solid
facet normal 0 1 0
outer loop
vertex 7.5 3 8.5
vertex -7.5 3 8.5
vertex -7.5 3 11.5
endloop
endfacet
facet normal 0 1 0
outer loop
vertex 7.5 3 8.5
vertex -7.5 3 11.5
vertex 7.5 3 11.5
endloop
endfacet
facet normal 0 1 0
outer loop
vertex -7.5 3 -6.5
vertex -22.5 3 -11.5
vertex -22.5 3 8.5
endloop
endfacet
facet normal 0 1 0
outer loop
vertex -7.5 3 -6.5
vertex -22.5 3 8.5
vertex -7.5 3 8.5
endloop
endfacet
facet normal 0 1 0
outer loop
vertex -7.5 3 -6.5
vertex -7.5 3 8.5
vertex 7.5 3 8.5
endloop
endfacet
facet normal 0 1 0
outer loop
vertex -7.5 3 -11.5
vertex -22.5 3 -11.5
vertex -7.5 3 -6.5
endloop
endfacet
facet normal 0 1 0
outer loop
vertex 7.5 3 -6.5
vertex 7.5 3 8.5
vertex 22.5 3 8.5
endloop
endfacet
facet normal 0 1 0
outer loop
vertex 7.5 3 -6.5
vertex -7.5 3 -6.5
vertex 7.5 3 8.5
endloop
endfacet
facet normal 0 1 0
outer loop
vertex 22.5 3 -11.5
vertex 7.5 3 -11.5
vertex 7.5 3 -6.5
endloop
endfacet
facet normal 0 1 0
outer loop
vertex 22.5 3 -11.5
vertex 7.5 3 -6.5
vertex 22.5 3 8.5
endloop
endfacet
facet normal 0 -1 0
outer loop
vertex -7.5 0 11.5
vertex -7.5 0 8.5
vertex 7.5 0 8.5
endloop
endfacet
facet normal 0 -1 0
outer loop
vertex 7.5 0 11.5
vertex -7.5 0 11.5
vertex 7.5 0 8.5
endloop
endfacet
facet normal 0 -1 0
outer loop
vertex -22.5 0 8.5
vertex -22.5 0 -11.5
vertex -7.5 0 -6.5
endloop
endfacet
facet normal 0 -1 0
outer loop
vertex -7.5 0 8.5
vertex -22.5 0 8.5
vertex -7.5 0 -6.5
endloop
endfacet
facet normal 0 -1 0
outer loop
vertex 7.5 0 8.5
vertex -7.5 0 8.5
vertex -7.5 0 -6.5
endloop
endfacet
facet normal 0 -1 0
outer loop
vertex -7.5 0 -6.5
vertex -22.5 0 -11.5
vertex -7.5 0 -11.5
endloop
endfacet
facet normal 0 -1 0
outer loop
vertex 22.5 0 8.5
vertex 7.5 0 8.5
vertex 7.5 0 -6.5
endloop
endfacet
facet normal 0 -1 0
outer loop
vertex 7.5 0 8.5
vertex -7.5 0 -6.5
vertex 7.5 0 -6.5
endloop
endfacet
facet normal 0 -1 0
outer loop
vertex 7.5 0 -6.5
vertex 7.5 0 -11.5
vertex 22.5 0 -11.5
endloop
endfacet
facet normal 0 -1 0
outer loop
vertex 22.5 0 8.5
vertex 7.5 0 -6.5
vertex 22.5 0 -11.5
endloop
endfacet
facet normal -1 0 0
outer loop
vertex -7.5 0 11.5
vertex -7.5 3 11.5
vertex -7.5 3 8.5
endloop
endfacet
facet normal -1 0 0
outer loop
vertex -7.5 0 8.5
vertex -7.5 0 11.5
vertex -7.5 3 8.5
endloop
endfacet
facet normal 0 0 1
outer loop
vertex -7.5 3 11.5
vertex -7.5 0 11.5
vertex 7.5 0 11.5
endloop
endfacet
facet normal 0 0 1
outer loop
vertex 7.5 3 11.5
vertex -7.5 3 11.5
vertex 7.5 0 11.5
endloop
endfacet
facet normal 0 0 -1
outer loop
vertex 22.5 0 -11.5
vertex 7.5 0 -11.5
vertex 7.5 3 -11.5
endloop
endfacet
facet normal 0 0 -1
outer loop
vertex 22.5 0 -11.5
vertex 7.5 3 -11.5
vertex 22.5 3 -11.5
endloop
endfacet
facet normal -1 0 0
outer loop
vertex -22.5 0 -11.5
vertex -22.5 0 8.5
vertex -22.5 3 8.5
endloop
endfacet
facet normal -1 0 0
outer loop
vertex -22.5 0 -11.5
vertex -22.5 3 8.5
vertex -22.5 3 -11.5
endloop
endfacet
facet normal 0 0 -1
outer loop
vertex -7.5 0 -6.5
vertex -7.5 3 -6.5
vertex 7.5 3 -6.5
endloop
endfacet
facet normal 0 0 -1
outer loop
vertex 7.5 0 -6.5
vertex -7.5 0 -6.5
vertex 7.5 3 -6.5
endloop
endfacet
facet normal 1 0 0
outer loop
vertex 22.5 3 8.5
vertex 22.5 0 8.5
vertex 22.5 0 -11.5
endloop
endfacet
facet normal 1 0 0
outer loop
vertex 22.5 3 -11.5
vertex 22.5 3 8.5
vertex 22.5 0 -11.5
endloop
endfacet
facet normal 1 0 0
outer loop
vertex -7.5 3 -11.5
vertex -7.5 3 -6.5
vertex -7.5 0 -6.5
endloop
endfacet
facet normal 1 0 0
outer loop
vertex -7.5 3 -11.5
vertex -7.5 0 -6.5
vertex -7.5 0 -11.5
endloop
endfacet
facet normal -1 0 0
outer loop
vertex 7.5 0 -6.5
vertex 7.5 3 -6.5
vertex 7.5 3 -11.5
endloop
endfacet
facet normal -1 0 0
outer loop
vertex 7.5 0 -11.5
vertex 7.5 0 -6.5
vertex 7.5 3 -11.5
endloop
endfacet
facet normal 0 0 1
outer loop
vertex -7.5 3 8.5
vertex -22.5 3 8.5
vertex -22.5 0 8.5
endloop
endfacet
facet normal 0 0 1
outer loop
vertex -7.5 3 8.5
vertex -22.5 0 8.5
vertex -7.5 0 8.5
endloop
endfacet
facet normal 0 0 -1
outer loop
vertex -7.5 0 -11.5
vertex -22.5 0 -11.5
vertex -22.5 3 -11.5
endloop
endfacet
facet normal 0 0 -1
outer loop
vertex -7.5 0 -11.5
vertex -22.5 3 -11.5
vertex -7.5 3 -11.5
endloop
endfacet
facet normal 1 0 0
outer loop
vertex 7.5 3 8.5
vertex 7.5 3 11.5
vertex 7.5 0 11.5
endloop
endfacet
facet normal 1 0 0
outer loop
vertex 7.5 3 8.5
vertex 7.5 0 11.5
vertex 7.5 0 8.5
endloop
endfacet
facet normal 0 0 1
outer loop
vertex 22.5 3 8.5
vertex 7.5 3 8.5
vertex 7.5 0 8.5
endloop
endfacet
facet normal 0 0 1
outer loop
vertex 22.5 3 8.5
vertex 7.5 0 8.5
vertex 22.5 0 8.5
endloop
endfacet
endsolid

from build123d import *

# Parameters (mm, degrees)
SKETCH2_W           = 45
SKETCH2_H           = 23
BOSS_EXTRUDE1_DEPTH = 3
SKETCH3_W           = 15
SKETCH3_H           = 5
CUT_FOR_PINS_DEPTH  = 3
SKETCH6_W           = 15
SKETCH6_H           = 3
CUT_EXTRUDE3_DEPTH  = 3


with BuildPart() as part:
    # Sketch2 → Boss-Extrude1 (new body)
    with BuildSketch(Plane(origin=(0, 0, 0), x_dir=(1, 0, 0), z_dir=(0, 1, 0))):
        Rectangle(SKETCH2_W, SKETCH2_H)
    extrude(amount=BOSS_EXTRUDE1_DEPTH)

    # Sketch3 → cut for pins (cut)
    with BuildSketch(Plane(origin=(0, 3, 0), x_dir=(1, 0, 0), z_dir=(0, 1, 0))):
        with Locations((0, 9)):
            Rectangle(SKETCH3_W, SKETCH3_H)
    extrude(amount=-CUT_FOR_PINS_DEPTH, mode=Mode.SUBTRACT)

    # Sketch6 → Cut-Extrude3 (cut)
    with BuildSketch(Plane(origin=(0, 3, 0), x_dir=(1, 0, 0), z_dir=(0, 1, 0))):
        with Locations((-15, -10)):
            Rectangle(SKETCH6_W, SKETCH6_H)
        with Locations((15, -10)):
            Rectangle(SKETCH6_W, SKETCH6_H)
    extrude(amount=-CUT_EXTRUDE3_DEPTH, mode=Mode.SUBTRACT)


solid = part.part
